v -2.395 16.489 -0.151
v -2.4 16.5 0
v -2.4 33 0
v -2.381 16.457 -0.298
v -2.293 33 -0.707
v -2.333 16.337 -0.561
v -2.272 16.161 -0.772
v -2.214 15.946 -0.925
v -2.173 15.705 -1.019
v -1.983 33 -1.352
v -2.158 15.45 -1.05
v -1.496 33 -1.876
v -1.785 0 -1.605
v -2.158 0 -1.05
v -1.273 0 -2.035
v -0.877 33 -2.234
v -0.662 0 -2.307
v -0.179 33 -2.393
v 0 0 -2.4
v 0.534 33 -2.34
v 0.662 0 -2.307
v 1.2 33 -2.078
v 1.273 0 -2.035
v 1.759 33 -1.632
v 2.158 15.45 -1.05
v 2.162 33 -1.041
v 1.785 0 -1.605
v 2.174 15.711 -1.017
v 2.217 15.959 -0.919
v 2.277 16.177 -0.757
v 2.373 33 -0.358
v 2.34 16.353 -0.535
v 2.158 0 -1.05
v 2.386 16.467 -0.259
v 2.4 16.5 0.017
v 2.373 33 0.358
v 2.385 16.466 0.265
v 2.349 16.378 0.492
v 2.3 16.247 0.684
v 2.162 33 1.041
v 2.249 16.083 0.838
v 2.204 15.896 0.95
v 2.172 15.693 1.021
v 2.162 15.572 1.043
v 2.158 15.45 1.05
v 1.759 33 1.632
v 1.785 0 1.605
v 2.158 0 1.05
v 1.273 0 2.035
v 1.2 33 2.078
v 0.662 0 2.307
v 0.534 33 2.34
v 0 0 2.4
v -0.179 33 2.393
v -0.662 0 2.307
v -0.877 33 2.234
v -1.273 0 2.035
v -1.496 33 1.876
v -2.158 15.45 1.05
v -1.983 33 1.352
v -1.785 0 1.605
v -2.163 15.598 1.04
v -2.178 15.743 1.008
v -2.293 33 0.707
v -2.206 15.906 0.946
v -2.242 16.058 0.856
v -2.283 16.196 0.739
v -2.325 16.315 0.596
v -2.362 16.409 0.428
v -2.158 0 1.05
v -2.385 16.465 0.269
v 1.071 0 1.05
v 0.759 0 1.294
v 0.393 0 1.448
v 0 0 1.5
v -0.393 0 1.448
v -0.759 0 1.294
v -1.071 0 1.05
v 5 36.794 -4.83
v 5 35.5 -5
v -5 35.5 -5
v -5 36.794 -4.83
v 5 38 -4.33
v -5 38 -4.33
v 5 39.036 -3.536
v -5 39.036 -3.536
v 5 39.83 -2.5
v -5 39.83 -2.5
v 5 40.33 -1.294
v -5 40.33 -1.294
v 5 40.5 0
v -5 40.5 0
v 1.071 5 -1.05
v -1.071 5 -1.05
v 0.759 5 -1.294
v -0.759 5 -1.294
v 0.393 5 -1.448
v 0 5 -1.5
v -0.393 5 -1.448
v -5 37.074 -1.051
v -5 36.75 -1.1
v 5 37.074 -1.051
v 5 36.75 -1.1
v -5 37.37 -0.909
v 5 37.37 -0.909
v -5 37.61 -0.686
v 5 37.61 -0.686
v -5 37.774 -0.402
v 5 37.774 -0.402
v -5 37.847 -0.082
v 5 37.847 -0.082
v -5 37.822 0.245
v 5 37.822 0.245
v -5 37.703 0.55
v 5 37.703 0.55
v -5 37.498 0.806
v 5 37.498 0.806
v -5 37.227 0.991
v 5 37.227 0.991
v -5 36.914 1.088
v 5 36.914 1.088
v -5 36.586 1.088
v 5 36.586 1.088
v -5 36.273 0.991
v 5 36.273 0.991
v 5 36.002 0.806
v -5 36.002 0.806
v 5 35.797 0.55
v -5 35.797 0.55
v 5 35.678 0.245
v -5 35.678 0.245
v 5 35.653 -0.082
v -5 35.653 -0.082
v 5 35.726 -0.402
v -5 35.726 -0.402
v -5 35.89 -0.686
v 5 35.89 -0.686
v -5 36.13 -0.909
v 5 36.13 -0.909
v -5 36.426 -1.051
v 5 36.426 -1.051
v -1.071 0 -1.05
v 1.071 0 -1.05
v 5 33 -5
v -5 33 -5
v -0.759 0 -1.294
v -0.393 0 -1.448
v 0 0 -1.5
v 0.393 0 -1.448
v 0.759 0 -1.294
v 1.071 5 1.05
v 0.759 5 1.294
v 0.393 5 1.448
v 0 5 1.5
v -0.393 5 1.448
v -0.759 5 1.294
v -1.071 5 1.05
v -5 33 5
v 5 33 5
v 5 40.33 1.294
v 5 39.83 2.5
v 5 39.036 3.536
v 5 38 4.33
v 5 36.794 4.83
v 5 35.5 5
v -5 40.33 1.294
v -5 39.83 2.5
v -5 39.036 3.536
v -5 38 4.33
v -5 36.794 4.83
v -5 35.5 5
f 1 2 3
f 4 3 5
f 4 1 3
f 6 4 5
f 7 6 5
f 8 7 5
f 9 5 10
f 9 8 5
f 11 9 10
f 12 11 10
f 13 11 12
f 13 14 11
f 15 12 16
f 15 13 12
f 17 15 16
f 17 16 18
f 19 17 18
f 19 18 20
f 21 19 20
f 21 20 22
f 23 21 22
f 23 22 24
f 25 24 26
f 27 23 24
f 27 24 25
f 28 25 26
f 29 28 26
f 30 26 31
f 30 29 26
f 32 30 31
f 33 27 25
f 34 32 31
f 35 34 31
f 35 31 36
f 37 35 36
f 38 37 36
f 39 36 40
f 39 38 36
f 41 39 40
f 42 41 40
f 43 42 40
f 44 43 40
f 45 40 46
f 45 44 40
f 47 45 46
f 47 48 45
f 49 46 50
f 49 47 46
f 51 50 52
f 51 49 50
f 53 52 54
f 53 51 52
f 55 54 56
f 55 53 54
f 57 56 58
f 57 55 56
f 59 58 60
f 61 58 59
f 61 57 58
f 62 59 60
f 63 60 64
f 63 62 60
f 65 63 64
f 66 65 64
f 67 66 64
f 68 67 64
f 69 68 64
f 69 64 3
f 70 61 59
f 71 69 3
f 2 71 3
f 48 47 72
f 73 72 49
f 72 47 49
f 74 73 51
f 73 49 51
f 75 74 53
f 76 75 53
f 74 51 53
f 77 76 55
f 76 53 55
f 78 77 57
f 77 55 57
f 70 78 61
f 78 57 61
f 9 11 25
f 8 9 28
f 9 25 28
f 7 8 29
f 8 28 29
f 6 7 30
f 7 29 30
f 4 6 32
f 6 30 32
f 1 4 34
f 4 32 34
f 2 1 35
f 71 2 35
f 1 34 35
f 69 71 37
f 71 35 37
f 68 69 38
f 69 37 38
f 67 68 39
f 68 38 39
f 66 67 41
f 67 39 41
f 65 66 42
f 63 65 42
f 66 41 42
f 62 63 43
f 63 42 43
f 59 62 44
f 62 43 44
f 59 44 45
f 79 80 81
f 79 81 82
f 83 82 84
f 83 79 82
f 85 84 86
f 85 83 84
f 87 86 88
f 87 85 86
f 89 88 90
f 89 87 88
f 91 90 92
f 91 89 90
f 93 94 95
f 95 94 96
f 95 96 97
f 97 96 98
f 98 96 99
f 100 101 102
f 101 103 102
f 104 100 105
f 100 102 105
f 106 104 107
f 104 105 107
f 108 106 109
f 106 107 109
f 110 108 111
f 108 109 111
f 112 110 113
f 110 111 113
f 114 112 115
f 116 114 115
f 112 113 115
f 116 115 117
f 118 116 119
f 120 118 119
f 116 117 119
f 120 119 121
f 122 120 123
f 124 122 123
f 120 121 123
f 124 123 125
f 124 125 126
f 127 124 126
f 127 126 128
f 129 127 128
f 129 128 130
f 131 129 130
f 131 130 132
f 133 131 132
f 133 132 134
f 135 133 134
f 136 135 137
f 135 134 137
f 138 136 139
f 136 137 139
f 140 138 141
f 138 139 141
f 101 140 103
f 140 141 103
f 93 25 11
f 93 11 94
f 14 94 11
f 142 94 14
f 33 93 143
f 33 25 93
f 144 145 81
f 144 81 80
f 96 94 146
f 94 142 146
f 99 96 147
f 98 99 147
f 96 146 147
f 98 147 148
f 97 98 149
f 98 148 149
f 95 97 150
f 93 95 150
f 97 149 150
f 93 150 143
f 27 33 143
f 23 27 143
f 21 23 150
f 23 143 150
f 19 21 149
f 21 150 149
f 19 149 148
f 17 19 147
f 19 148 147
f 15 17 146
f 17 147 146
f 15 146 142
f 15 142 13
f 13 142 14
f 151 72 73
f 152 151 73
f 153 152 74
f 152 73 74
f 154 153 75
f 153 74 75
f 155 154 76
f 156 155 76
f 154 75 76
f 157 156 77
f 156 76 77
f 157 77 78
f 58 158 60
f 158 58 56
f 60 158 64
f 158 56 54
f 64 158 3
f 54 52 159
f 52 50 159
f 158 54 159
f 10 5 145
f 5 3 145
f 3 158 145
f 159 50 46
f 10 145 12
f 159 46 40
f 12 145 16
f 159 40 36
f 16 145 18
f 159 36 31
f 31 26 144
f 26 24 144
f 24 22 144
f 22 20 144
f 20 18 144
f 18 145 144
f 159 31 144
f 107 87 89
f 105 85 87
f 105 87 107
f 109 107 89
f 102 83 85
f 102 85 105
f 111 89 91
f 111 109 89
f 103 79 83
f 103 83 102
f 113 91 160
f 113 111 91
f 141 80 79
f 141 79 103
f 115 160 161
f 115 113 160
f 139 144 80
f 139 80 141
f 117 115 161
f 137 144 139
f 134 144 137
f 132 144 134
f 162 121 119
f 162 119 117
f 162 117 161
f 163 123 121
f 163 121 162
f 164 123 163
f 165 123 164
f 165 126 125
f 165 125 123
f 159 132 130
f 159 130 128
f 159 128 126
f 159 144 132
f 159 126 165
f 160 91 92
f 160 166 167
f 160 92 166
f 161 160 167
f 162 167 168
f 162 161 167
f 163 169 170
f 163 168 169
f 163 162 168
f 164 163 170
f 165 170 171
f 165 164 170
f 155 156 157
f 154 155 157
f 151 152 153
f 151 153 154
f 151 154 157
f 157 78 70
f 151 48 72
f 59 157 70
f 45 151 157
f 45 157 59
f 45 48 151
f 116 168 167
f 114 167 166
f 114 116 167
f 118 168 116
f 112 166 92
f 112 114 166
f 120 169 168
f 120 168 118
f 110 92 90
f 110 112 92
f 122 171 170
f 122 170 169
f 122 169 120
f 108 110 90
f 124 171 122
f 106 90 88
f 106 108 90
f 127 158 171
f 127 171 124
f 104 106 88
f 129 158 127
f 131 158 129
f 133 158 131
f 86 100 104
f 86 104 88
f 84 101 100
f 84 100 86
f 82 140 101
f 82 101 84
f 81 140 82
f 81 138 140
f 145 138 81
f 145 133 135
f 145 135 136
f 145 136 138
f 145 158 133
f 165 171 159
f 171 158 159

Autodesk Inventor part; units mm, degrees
ref_plane "YZ Plane" through (0, 0, 0) normal (1, 0, 0) x (0, 1, 0)
ref_plane "XZ Plane" through (0, 0, 0) normal (0, 1, 0) x (-1, 0, 0)
ref_plane "XY Plane" through (0, 0, 0) normal (0, 0, 1) x (1, 0, 0)
sketch "Sketch1" plane through (0, 0, 0) normal (0, 1, 0) x (-1, 0, 0)
  circle A0 centre (0, 0) radius 2.4
  dimension "d0" = 4.8
extrude "Extrusion1" add sketch "Sketch1" along normal blind 33
sketch "Sketch2" plane through (0, 33, 0) normal (0, 1, 0) x (1, 0, 0)
  line L0 (-5, 0) -> (5, 0)
  line L1 (-5, 0) -> (-5, -5)
  line L2 (-5, -5) -> (5, -5)
  line L3 (5, -5) -> (5, 0)
  line L4 (-5, 0) -> (-5, 5)
  line L5 (-5, 5) -> (5, 5)
  line L6 (5, 5) -> (5, 0)
  point P0 (0, 0)
  dimension "d4" = 10
  dimension "d5" = 5
  dimension "d6" = 5
extrude "Extrusion2" add sketch "Sketch2" along normal blind 7.5
fillet "Fillet1" radius 5 2 edges at (0, 40.5, 5) (0, 40.5, -5)
sketch "Sketch3" plane through (5, 33, 5) normal (1, 0, 0) x (0, 0, -1)
  line L0 (10, 0) -> (0, 0) projected
  line L1 (5, 0) -> (5, 7.5)
  arc A0 (10, 2.5) -> (0, 2.5) centre (5, 2.5) ccw projected
  line L2 (5, 0) -> (5, 3.75)
  circle A1 centre (5, 3.75) radius 1.1
  point P0 (5, -33)
  dimension "d10" = 2.2
extrude "Extrusion3" cut sketch "Sketch3" against normal through all
sketch "Sketch5" plane through (0, 0, 0) normal (0, -1, 0) x (1, 0, 0)
  circle A0 centre (0, 0) radius 2.4
  circle A1 centre (0, 0) radius 1.5
  dimension "d19" = 3
extrude "Extrusion5" cut sketch "Sketch5" against normal blind 5 contours A1
sketch "Sketch6" plane through (5, 33, 5) normal (1, 0, 0) x (0, 0, -1)
  line L0 (5, -33) -> (5, -32)
  line L1 (5, -32) -> (5, -24)
  line L2 (5, -24) -> (5, -32) construction
  line L3 (3.95, -25.05) -> (3.95, -30.95)
  line L4 (6.05, -30.95) -> (6.05, -25.05)
  arc A0 (6.05, -25.05) -> (3.95, -25.05) centre (5, -25.05) ccw
  arc A1 (3.95, -30.95) -> (6.05, -30.95) centre (5, -30.95) ccw
  line L5 (5, -33) -> (5, -24) construction
  line L6 (7.4, -33) -> (2.6, -33) projected
  line L7 (3.95, -31.95) -> (3.95, -25.05)
  line L8 (6.05, -25.05) -> (6.05, -31.95)
  arc A2 (3.95, -31.95) -> (6.05, -31.95) centre (5, -31.95) ccw
  arc A3 (6.05, -25.05) -> (3.95, -25.05) centre (5, -25.05) ccw
  line L9 (3.95, -31.95) -> (3.95, -33)
  line L10 (6.05, -31.95) -> (6.05, -33)
  line L11 (3.95, -33) -> (6.05, -33)
  line L12 (5, -24) -> (5, 0)
  line L13 (7.4, 0) -> (2.6, 0) projected
  line L14 (5, 0) -> (5, -33)
  line L15 (5, -16.5) -> (7.4, -16.5)
  line L16 (7.4, -33) -> (7.4, 0) projected
  line L17 (5, -16.5) -> (5, -28) construction
  line L18 (3.95, -17.55) -> (3.95, -26.95)
  line L19 (6.05, -26.95) -> (6.05, -17.55)
  arc A4 (6.05, -17.55) -> (3.95, -17.55) centre (5, -17.55) ccw
  arc A5 (3.95, -26.95) -> (6.05, -26.95) centre (5, -26.95) ccw
  point P0 (5, -28.5)
  point P1 (6.05, -30.95)
  point P2 (5, -22.25)
  dimension "d22" = 1
  dimension "d23" = 8
  dimension "d24" = 2.1
extrude "Extrusion6" cut sketch "Sketch6" against normal through all contours A2 L7 A1 L0 | A2 L10 L6 | L6 L9 A2 | L0 A1 L8 A2 | A1 L3 A5 L1 | L1 A5 L4 A1 | A5 L3 A0 L1 | L1 A0 L4 A5 | L12 A4 L19 A0 | A0 L18 A4 L12
properties part number "pist"
